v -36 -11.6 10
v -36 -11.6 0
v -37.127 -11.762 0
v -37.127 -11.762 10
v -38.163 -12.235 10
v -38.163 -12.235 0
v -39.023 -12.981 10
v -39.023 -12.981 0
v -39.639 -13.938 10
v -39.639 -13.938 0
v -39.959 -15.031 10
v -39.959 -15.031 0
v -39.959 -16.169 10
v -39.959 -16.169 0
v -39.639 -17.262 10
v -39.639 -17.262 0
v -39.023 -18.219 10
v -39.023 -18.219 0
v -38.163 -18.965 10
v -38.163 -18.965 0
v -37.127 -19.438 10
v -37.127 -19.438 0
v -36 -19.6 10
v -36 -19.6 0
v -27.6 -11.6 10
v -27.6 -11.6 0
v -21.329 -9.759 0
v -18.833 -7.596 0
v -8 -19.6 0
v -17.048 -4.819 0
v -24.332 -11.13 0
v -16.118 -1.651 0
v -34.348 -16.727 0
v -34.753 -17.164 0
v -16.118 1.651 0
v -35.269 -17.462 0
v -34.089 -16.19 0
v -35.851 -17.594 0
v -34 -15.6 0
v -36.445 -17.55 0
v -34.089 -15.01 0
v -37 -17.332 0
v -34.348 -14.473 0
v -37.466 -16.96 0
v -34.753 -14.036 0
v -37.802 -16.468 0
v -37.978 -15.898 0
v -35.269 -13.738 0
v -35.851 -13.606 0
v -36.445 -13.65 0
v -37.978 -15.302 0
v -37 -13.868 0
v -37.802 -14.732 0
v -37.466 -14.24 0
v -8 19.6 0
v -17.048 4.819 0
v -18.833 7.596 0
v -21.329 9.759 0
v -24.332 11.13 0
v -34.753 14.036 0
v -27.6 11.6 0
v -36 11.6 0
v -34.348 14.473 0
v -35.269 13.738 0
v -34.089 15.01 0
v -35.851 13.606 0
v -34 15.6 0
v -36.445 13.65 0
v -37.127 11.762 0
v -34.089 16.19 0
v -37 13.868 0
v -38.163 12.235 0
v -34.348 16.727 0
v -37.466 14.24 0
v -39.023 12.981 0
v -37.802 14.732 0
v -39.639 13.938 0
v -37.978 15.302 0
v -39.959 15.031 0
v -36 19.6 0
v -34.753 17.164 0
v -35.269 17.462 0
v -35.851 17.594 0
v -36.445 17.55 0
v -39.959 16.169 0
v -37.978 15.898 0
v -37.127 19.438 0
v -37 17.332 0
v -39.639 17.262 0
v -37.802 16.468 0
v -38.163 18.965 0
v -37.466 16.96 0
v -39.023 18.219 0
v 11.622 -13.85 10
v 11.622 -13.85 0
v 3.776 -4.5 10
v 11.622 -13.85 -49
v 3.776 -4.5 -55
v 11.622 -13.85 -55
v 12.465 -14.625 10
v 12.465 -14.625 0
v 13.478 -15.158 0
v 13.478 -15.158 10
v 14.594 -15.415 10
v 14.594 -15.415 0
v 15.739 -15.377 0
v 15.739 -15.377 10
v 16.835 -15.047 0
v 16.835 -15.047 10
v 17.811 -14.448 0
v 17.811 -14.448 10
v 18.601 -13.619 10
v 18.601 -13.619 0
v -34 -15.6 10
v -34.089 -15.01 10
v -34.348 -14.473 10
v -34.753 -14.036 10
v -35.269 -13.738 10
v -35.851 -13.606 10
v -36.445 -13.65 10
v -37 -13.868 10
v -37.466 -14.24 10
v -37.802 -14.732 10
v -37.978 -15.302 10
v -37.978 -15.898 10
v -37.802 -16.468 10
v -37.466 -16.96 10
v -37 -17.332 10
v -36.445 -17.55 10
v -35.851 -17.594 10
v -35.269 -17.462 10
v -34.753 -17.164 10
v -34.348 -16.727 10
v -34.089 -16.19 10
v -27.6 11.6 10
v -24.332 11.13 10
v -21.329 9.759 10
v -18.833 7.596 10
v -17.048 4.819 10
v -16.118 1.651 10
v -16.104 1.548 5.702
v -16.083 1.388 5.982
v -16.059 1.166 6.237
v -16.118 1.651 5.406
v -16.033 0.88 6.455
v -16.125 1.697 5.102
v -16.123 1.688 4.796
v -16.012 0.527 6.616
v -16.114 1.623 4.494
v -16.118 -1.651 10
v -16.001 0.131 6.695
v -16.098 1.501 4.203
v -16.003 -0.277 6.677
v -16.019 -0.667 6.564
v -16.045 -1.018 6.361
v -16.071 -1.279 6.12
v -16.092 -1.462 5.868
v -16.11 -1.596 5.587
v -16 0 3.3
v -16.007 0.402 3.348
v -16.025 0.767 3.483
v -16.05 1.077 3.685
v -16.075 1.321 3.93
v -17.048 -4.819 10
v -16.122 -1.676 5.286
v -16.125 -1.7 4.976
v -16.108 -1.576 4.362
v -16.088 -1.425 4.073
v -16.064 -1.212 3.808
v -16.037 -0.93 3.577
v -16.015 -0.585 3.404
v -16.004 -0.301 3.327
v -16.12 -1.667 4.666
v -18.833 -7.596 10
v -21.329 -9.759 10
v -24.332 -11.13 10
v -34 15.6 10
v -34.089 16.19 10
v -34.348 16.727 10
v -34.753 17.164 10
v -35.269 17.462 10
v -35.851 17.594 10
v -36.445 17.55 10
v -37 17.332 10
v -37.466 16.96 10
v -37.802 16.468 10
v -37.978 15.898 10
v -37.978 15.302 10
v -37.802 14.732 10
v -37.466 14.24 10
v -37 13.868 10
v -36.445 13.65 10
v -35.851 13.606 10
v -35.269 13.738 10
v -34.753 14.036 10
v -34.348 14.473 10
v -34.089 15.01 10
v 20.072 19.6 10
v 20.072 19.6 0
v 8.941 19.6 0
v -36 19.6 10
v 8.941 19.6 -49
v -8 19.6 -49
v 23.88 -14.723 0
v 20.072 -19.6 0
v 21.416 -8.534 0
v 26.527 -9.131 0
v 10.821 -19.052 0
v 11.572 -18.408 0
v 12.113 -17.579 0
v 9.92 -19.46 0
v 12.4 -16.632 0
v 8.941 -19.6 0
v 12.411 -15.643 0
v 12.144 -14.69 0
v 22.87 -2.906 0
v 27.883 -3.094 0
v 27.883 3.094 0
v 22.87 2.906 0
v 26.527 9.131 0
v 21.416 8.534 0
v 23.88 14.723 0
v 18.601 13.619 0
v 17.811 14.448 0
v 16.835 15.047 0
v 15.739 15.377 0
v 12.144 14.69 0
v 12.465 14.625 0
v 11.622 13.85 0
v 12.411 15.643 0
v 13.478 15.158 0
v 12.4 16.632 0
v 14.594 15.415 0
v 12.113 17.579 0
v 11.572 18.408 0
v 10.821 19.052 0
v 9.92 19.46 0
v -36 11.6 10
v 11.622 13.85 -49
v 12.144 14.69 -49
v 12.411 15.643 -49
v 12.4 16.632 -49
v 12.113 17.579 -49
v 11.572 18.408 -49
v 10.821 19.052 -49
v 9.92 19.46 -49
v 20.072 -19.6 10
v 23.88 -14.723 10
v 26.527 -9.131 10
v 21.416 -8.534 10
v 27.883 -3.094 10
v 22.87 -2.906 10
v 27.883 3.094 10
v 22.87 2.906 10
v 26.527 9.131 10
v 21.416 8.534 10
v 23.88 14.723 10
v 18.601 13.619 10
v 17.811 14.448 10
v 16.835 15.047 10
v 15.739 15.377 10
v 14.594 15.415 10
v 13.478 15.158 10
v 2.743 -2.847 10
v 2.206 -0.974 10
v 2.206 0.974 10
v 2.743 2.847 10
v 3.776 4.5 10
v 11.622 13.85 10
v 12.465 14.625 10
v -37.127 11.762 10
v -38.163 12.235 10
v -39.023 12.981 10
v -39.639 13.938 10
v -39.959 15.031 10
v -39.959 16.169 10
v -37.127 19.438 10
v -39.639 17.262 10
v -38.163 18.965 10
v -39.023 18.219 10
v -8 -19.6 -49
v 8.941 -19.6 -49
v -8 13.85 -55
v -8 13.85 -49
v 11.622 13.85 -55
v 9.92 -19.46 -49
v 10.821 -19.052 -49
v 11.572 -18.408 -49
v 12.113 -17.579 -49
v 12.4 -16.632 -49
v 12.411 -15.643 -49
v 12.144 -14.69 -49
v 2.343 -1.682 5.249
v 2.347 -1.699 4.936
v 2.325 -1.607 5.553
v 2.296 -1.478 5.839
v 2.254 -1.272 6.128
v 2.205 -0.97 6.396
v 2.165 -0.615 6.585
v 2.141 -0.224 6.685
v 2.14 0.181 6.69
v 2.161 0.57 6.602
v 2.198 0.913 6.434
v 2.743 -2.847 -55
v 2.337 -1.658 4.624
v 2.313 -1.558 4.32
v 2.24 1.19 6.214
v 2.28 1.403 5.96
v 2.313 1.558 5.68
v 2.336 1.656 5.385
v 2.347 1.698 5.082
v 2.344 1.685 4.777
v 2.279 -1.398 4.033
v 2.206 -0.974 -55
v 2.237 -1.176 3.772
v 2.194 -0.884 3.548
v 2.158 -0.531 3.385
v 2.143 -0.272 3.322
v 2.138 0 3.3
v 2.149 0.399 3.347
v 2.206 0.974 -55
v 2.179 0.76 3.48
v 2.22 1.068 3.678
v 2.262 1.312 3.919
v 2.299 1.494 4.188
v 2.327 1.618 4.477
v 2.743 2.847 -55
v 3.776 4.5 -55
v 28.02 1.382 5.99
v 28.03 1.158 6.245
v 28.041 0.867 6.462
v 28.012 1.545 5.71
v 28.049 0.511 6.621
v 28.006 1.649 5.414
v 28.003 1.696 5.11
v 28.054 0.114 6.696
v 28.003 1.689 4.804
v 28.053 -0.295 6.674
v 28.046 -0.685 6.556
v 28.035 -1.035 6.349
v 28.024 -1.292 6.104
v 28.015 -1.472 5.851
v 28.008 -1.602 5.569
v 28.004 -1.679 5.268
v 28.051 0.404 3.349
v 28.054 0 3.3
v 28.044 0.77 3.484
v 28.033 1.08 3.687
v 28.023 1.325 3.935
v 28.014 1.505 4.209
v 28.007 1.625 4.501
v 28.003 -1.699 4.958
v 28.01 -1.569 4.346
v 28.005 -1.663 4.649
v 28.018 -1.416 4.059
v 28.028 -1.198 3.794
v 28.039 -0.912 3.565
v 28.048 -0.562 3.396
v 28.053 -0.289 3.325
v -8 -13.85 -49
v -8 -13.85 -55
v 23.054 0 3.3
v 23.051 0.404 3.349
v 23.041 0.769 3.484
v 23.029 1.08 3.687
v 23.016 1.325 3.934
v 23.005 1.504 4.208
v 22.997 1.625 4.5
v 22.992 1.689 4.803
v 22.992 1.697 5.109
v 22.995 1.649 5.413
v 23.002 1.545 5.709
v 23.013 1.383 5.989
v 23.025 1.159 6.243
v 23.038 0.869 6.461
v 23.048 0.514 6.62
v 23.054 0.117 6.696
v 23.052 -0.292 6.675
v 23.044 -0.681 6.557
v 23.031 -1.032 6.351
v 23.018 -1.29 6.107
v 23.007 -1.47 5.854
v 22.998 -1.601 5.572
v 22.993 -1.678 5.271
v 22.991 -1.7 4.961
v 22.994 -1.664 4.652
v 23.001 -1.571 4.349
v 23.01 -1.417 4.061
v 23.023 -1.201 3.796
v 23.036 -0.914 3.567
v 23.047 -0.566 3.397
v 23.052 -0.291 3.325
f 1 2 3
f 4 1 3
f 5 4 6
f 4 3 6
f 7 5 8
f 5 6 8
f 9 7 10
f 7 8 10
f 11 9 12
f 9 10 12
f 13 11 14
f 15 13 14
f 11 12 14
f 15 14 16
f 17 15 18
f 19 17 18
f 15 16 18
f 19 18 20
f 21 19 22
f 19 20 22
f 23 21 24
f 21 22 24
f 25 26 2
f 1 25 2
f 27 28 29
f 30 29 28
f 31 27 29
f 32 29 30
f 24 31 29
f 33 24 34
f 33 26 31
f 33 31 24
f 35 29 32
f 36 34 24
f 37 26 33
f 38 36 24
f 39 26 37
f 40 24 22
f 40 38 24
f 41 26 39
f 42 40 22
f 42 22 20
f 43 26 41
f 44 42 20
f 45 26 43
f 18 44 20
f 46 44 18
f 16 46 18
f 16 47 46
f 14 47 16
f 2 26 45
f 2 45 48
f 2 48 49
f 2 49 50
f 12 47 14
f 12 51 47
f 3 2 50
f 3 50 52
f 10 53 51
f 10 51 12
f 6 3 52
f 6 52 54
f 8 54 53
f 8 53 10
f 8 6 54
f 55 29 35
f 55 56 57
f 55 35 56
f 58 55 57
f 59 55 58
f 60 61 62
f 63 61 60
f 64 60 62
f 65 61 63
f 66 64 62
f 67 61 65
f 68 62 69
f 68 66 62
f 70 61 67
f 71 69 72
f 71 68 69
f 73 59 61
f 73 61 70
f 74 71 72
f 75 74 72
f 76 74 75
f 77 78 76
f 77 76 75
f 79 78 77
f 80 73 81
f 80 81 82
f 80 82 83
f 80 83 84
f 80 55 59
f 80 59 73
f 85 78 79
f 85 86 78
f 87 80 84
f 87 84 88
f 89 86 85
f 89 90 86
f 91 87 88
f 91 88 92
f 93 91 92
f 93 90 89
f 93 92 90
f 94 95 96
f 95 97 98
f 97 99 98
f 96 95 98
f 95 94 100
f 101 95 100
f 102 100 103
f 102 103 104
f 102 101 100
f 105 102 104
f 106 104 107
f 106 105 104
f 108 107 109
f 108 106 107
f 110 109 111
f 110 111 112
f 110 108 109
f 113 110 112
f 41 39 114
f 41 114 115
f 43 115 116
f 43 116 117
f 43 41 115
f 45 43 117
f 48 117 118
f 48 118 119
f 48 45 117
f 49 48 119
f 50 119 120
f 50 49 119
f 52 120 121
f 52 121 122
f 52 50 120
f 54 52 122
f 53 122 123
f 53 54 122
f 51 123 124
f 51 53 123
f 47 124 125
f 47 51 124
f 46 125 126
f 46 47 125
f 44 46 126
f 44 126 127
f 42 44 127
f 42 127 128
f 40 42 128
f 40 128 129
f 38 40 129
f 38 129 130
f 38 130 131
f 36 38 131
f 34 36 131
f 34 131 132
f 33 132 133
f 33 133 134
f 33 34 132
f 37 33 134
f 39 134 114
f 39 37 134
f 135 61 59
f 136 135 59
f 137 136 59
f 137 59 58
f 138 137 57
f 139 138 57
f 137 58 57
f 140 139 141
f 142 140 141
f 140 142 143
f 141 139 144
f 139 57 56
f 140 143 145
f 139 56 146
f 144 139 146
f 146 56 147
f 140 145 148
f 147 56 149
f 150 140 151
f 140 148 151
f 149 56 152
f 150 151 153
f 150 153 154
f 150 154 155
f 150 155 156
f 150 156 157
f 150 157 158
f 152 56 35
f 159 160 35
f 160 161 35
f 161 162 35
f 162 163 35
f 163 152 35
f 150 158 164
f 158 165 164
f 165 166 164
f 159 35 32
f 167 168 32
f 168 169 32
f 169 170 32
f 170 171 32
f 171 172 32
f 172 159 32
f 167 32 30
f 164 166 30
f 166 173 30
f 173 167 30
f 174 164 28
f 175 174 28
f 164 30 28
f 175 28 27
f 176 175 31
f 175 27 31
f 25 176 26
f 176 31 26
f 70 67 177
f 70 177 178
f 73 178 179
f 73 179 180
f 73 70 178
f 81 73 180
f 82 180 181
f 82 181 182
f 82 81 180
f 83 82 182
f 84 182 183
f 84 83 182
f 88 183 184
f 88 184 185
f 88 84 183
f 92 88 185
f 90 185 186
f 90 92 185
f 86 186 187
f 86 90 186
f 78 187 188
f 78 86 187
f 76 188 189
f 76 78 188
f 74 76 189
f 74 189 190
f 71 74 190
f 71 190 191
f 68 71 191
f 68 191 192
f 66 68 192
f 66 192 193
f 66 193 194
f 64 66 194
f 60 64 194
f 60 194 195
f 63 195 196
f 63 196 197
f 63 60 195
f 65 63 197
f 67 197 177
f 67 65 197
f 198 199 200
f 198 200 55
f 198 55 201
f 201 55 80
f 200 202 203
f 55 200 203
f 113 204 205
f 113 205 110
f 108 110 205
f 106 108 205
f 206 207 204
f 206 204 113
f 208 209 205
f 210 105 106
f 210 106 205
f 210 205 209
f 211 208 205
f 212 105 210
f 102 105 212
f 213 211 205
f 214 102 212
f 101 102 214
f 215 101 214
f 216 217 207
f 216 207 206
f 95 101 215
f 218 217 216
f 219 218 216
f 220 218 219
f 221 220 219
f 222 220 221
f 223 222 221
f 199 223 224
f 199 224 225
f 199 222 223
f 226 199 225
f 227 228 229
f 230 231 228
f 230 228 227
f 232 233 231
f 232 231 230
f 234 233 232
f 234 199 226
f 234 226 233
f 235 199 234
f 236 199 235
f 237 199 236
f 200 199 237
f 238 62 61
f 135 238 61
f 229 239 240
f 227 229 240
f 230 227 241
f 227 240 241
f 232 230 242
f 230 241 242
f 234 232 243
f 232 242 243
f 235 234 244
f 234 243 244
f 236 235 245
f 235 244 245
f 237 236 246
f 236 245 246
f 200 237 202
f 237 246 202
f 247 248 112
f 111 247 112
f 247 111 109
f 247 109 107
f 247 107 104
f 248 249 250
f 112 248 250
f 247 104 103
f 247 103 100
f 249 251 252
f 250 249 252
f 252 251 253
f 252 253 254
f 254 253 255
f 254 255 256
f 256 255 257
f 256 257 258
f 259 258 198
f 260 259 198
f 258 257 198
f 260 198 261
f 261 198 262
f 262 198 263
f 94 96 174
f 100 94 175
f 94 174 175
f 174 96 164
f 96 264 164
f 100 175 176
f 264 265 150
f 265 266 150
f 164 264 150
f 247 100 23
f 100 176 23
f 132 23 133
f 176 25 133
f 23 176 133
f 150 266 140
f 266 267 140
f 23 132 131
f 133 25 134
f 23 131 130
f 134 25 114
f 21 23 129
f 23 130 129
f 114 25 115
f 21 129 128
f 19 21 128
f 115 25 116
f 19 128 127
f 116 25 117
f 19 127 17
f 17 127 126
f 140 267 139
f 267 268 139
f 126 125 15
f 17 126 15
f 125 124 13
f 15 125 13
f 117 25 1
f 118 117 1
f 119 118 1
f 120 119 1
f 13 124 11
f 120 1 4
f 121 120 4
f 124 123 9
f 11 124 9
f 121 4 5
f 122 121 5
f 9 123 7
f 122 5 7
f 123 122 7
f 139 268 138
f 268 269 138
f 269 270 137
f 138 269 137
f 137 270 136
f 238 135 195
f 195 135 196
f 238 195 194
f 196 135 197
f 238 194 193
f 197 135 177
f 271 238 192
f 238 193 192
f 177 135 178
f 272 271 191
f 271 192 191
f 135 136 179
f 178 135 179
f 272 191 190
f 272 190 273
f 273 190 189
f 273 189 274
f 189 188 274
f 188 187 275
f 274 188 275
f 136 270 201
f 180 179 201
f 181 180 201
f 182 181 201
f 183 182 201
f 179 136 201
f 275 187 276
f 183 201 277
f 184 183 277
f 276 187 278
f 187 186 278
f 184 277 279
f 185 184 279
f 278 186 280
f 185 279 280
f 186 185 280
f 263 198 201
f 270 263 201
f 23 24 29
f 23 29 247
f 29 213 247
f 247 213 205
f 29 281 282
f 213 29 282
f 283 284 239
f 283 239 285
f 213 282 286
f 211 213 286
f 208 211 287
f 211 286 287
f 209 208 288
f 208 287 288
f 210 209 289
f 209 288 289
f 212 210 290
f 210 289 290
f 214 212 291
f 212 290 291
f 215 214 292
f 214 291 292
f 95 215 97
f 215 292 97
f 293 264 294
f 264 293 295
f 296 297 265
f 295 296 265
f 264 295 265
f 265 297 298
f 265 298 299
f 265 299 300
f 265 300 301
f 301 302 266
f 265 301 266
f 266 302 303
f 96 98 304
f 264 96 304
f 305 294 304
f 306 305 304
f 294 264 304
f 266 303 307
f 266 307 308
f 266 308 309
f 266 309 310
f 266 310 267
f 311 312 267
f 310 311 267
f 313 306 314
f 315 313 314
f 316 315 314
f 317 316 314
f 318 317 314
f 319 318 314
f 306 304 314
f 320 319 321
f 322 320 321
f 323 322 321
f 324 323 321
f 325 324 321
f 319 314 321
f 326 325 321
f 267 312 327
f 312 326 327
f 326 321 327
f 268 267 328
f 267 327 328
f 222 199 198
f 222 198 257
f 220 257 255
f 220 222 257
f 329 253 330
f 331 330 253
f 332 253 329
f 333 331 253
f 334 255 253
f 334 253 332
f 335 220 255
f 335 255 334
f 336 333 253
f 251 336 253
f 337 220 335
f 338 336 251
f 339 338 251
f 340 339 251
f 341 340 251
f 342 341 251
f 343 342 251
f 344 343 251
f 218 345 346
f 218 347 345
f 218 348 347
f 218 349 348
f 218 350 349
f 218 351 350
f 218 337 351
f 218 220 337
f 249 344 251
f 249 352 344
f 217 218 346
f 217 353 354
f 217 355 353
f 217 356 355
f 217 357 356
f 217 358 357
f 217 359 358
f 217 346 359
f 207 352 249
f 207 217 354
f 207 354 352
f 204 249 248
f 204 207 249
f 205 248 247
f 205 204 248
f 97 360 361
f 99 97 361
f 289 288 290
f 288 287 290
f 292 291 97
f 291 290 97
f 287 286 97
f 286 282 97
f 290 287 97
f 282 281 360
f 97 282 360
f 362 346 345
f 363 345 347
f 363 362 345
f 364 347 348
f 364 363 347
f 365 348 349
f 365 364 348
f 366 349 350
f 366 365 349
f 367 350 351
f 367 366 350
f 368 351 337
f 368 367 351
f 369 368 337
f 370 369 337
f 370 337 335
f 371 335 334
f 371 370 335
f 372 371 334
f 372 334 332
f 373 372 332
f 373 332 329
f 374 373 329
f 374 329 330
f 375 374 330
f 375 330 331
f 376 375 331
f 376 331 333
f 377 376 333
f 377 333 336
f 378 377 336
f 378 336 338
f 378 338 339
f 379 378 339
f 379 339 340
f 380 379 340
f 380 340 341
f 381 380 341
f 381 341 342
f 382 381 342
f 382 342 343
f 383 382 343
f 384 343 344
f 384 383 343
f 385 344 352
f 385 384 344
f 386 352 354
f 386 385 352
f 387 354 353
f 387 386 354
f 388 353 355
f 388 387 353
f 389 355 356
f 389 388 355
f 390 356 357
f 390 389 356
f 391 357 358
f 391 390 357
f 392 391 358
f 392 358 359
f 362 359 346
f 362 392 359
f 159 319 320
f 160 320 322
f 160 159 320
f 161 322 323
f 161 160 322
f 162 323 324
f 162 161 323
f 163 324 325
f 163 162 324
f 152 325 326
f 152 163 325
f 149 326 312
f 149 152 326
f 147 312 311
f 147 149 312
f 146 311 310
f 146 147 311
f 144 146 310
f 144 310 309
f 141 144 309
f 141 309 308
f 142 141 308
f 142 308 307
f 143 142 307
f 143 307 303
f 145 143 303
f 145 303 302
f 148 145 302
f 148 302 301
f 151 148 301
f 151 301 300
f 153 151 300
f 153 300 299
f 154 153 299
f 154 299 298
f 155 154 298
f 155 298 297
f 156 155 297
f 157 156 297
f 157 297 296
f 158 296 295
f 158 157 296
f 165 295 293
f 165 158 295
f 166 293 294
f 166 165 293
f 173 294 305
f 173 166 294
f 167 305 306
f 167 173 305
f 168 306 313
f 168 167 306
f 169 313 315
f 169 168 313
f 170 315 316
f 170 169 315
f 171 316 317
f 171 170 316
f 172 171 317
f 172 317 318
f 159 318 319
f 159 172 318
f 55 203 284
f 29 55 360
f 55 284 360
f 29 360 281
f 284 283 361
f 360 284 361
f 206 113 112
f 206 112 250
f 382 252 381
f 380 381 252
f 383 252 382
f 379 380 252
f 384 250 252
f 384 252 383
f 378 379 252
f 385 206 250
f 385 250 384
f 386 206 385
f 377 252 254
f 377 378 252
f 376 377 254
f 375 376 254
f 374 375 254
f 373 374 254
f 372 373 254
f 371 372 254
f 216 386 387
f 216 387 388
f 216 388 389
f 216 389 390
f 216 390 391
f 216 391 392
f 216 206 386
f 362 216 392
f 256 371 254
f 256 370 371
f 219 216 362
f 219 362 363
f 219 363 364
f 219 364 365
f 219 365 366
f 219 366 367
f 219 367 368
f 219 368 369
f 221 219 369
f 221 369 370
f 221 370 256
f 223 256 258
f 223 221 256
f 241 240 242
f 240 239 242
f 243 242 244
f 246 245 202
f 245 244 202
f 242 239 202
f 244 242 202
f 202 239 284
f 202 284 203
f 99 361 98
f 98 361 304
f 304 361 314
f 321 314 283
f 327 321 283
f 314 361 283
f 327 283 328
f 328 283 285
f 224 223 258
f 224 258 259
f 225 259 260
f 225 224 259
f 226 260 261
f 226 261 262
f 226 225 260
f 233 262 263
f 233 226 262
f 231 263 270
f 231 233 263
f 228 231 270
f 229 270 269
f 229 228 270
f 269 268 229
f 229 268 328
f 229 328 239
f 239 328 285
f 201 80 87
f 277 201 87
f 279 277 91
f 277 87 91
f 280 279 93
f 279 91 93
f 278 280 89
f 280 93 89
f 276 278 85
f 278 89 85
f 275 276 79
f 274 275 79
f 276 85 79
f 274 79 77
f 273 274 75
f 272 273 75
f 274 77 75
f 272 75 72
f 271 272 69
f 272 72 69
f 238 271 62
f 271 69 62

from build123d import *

# Parameters (mm, degrees)
SKETCH_1_R               = 2
EXTRUDE_1_DEPTH          = 10
EXTRUDE_START            = -15
EXTRUDE_2_DEPTH          = 15
EXTRUDE_START_2          = -55
EXTRUDE_3_DEPTH          = 40
CUT_EXTRUDE_1_DEPTH      = 71.775419462
CUT_EXTRUDE_1_DEPTH_BACK = 71.775419462
SKETCH_2_R               = 1.7
SKETCH_2_W               = 6
SKETCH_2_H               = 5.749756634


with BuildPart() as part:
    # 草图1 → 凸台-拉伸1 (new body)
    # profile 1 of 3: a face of its own
    with BuildSketch(Plane.XY):
        with BuildLine():
            Line((3.775539923, 4.499513268), (11.6217341, 13.850243366))
            ThreePointArc((11.6217341, 13.850243366), (12.112655804, 17.579163916), (8.940578549, 19.6))
            Line((8.940578549, 19.6), (-8, 19.6))
            Line((-8, 19.6), (-8, -19.6))
            Line((-8, -19.6), (8.940578549, -19.6))
            ThreePointArc((8.940578549, -19.6), (12.112655804, -17.579163916), (11.6217341, -13.850243366))
            Line((11.6217341, -13.850243366), (3.775539923, -4.499513268))
            ThreePointArc((3.775539923, -4.499513268), (2.137851025, 0), (3.775539923, 4.499513268))
        make_face()
    # profile 2 of 3: a face of its own
    with BuildSketch(Plane.XY):
        with BuildLine():
            Line((-8, -19.6), (-8, 19.6))
            Line((-8, 19.6), (-21.5, 19.6))
            Line((-21.5, 19.6), (-36, 19.6))
            ThreePointArc((-36, 19.6), (-40, 15.6), (-36, 11.6))
            Line((-36, 11.6), (-27.6, 11.6))
            ThreePointArc((-27.6, 11.6), (-16, 0), (-27.6, -11.6))
            Line((-27.6, -11.6), (-36, -11.6))
            ThreePointArc((-36, -11.6), (-40, -15.6), (-36, -19.6))
            Line((-36, -19.6), (-21.5, -19.6))
            Line((-21.5, -19.6), (-8, -19.6))
        make_face()
        with Locations((-36, -15.6)):
            Circle(SKETCH_1_R, mode=Mode.SUBTRACT)
        with Locations((-36, 15.6)):
            Circle(SKETCH_1_R, mode=Mode.SUBTRACT)
    # profile 3 of 3: a face of its own
    with BuildSketch(Plane.XY):
        with BuildLine():
            ThreePointArc((18.601156804, 13.619370123), (15.167616283, 15.432881266), (11.6217341, 13.850243366))
            ThreePointArc((11.6217341, 13.850243366), (12.112655804, 17.579163916), (8.940578549, 19.6))
            Line((8.940578549, 19.6), (20.071646816, 19.6))
            ThreePointArc((20.071646816, 19.6), (28.054072893, 0), (20.071646816, -19.6))
            Line((20.071646816, -19.6), (8.940578549, -19.6))
            ThreePointArc((8.940578549, -19.6), (12.112655804, -17.579163916), (11.6217341, -13.850243366))
            ThreePointArc((11.6217341, -13.850243366), (15.167616283, -15.432881266), (18.601156804, -13.619370123))
            ThreePointArc((18.601156804, -13.619370123), (23.054072893, 0), (18.601156804, 13.619370123))
        make_face()
    extrude(amount=EXTRUDE_1_DEPTH)

    # 草图1<3> → 凸台-拉伸2 (add)
    with BuildSketch(Plane.XY.offset(EXTRUDE_START)):
        with BuildLine():
            Line((3.775539923, 4.499513268), (11.6217341, 13.850243366))
            ThreePointArc((11.6217341, 13.850243366), (12.112655804, 17.579163916), (8.940578549, 19.6))
            Line((8.940578549, 19.6), (-8, 19.6))
            Line((-8, 19.6), (-8, -19.6))
            Line((-8, -19.6), (8.940578549, -19.6))
            ThreePointArc((8.940578549, -19.6), (12.112655804, -17.579163916), (11.6217341, -13.850243366))
            Line((11.6217341, -13.850243366), (3.775539923, -4.499513268))
            ThreePointArc((3.775539923, -4.499513268), (2.137851025, 0), (3.775539923, 4.499513268))
        make_face()
    extrude(amount=EXTRUDE_2_DEPTH)

    # 草图1<4> → 凸台-拉伸3 (add)
    with BuildSketch(Plane.XY.offset(EXTRUDE_START_2)):
        with BuildLine():
            Line((3.775539923, 4.499513268), (11.6217341, 13.850243366))
            ThreePointArc((11.6217341, 13.850243366), (12.112655804, 17.579163916), (8.940578549, 19.6))
            Line((8.940578549, 19.6), (-8, 19.6))
            Line((-8, 19.6), (-8, -19.6))
            Line((-8, -19.6), (8.940578549, -19.6))
            ThreePointArc((8.940578549, -19.6), (12.112655804, -17.579163916), (11.6217341, -13.850243366))
            Line((11.6217341, -13.850243366), (3.775539923, -4.499513268))
            ThreePointArc((3.775539923, -4.499513268), (2.137851025, 0), (3.775539923, 4.499513268))
        make_face()
    extrude(amount=EXTRUDE_3_DEPTH)

    # 草图2 → 切除-拉伸1 (cut, two sides: drawn at the far end of the back side and taken through both)
    with BuildSketch(Plane(origin=(0, 0, 0), x_dir=(0, 0, -1), z_dir=(1, 0, 0)).offset(-CUT_EXTRUDE_1_DEPTH_BACK)):
        with Locations((-5, 0)):
            Circle(SKETCH_2_R)
        with Locations((52, 16.725121683)):
            Rectangle(SKETCH_2_W, SKETCH_2_H)
        with Locations((52, -16.725121683)):
            Rectangle(SKETCH_2_W, SKETCH_2_H)
    extrude(amount=CUT_EXTRUDE_1_DEPTH + CUT_EXTRUDE_1_DEPTH_BACK, mode=Mode.SUBTRACT)


solid = part.part
